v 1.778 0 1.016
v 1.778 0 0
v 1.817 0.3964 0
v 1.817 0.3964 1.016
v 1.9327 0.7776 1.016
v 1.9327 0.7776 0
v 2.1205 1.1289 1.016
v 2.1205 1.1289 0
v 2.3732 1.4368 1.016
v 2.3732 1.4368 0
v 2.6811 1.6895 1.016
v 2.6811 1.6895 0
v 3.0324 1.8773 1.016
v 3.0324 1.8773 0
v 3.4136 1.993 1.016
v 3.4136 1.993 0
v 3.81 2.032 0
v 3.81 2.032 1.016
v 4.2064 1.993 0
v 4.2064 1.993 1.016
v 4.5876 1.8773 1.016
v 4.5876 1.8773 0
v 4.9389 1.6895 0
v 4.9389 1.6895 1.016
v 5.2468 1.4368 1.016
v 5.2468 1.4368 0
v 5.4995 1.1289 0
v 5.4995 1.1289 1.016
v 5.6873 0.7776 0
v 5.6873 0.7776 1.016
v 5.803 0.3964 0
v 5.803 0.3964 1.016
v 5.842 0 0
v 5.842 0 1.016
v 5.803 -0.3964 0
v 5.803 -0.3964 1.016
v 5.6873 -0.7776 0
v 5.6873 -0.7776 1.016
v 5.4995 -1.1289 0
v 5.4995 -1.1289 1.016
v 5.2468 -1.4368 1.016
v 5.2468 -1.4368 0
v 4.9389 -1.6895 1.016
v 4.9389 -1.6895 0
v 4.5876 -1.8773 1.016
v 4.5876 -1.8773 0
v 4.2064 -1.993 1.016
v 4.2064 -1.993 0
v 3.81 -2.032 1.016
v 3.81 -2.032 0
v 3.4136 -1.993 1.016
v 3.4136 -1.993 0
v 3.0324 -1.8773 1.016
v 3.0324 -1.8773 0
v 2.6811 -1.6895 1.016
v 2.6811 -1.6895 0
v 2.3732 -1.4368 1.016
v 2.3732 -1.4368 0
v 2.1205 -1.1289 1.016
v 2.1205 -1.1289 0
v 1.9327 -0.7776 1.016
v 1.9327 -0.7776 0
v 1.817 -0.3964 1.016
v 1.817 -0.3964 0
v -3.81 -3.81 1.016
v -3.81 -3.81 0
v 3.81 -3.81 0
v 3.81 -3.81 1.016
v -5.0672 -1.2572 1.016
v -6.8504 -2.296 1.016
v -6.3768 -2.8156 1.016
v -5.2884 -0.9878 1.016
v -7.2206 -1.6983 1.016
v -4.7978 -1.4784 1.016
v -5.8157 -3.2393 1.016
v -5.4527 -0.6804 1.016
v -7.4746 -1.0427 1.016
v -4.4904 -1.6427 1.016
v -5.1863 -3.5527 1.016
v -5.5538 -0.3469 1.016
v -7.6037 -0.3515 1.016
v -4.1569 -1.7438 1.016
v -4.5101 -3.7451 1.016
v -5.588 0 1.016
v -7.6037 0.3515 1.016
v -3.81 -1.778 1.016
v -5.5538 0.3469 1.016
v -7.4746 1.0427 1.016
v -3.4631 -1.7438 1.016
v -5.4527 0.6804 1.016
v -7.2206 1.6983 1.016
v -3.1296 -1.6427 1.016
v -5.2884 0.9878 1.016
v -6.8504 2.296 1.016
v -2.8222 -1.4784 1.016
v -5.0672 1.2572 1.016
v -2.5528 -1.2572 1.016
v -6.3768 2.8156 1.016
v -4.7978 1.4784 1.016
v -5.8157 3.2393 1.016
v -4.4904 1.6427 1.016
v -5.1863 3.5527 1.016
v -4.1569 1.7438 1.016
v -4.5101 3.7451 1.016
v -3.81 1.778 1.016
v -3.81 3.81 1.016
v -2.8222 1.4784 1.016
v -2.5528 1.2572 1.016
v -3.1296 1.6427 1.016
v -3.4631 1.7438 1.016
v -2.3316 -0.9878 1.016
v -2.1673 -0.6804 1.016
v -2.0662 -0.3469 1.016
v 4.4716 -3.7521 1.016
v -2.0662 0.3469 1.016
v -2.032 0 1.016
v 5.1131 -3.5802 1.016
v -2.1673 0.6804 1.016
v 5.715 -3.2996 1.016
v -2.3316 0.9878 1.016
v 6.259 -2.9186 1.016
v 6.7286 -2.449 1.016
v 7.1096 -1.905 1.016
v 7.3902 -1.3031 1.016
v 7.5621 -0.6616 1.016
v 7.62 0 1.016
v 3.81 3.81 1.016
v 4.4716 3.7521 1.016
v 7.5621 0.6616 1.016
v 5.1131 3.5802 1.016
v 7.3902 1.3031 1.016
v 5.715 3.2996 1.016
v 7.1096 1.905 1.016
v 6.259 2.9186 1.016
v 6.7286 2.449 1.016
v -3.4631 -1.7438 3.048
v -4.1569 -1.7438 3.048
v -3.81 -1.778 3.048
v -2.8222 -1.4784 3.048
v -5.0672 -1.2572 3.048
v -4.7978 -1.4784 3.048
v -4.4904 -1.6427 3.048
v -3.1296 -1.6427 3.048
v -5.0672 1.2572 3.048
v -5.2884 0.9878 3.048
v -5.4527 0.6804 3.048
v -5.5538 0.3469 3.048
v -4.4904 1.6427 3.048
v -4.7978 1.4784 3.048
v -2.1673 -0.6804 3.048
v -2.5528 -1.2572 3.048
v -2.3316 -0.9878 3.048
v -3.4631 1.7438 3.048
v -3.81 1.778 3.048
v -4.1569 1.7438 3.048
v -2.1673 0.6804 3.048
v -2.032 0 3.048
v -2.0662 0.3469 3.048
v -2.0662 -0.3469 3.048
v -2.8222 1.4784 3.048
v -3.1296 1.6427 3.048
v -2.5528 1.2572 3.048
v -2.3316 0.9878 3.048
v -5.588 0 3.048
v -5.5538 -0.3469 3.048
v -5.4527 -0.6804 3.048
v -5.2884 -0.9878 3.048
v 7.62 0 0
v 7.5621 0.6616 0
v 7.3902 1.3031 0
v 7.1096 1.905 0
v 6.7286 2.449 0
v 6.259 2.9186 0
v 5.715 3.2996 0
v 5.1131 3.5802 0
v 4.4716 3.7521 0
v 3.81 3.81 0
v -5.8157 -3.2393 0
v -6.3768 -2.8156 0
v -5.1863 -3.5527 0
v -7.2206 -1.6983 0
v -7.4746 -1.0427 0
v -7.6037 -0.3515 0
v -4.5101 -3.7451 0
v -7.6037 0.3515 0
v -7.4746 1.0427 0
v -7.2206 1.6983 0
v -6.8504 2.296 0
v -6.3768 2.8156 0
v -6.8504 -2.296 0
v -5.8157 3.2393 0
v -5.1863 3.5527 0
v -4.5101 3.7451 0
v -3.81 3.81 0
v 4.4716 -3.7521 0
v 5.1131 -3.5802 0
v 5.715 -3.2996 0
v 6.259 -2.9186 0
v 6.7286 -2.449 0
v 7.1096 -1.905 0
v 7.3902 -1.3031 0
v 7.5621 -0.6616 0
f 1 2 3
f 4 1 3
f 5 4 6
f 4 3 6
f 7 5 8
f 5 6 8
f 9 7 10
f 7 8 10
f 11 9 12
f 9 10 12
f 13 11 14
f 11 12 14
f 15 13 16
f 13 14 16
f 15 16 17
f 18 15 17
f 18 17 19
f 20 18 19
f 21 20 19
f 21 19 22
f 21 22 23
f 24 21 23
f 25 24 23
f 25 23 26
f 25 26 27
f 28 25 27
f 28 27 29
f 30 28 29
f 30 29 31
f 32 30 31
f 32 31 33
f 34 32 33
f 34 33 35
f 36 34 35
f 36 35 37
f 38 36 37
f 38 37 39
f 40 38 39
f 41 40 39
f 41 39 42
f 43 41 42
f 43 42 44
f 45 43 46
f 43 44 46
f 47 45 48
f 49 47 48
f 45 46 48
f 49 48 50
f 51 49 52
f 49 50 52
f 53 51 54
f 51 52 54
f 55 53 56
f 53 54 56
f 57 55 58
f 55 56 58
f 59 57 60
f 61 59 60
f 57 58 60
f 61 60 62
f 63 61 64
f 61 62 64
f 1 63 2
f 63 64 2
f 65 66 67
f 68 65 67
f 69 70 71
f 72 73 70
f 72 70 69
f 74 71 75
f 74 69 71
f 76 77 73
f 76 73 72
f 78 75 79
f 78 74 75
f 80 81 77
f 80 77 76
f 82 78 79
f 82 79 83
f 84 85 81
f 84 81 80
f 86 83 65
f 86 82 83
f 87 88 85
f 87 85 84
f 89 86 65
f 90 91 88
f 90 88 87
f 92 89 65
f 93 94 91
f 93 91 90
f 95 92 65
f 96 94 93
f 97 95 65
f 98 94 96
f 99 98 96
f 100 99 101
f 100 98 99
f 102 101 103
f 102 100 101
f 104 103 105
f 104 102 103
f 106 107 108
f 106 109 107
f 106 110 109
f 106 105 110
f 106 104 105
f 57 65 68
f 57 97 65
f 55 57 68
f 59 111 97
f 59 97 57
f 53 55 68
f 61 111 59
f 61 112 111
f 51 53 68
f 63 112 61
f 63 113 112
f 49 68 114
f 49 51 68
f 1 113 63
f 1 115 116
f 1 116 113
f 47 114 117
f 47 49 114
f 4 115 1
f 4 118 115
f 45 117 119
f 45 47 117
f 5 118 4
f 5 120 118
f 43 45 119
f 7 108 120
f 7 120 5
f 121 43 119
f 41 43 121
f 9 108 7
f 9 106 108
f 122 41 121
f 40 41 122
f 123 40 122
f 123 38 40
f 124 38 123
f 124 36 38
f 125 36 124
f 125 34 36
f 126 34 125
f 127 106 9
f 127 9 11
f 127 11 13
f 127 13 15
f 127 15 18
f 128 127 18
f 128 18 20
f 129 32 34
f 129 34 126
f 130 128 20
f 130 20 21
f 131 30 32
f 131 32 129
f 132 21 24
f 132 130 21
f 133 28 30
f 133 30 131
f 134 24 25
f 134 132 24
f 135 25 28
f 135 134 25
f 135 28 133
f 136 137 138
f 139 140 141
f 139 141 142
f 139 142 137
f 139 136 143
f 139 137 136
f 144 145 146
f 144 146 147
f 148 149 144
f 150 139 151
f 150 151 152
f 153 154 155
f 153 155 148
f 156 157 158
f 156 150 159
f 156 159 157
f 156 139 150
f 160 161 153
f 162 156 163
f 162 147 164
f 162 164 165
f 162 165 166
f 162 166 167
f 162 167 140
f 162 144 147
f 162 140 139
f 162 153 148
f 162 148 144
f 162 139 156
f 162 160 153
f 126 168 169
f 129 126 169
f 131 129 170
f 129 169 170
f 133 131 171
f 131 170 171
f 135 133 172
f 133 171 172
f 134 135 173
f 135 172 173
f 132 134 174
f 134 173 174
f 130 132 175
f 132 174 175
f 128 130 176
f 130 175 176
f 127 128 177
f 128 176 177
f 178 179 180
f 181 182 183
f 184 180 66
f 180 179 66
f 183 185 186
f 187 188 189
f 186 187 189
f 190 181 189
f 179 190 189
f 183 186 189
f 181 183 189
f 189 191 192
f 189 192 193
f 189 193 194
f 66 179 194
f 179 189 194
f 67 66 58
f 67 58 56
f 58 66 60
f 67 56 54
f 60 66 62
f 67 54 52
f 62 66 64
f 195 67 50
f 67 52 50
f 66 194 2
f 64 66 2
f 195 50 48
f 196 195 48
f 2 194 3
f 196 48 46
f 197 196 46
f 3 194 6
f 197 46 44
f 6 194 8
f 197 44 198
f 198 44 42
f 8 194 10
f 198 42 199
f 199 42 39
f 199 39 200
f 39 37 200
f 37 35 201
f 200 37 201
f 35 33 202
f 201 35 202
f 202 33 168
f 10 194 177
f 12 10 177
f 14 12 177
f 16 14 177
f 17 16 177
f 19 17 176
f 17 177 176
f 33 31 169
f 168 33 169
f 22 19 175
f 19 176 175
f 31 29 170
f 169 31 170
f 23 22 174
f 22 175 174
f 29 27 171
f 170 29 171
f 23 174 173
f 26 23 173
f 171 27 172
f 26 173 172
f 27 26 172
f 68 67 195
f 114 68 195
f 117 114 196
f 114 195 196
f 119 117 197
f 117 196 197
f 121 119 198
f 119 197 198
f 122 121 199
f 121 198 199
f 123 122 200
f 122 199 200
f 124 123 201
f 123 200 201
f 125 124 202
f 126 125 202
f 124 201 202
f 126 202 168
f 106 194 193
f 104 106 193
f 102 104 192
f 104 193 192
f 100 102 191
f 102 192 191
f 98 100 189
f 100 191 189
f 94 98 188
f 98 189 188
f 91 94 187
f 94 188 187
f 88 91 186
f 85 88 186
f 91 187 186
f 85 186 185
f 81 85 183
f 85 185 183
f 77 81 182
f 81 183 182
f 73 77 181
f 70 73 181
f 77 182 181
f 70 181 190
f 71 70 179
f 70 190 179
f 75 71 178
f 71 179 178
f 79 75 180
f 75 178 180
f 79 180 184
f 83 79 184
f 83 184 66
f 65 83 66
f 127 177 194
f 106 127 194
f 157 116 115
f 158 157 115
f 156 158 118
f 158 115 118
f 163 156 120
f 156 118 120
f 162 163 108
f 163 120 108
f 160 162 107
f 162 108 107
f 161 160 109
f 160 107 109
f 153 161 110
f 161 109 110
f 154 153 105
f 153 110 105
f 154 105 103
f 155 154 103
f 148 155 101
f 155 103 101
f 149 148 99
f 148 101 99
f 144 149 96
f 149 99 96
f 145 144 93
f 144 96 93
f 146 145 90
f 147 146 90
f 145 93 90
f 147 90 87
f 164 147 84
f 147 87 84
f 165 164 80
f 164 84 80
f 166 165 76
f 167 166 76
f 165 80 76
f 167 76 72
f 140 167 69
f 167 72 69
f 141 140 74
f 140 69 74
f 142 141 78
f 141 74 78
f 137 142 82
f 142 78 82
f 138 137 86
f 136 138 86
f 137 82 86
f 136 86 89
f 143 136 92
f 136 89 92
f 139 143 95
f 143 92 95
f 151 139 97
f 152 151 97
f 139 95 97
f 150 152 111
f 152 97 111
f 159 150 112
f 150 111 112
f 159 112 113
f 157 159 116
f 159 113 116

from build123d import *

# Parameters (mm, degrees)
F1_DEPTH = 1.016
F3_D     = 4.064
F4_R     = 1.778
F5_DEPTH = 2.032


with BuildPart() as f1:
    # F0 (on Top) → F1 (new body)
    with BuildSketch(Plane.XY):
        with BuildLine():
            ThreePointArc((-3.81, -3.81), (-1.115923, -2.694077), (0, 0))
            ThreePointArc((0, 0), (-1.115923, 2.694077), (-3.81, 3.81))
            ThreePointArc((-3.81, 3.81), (-7.62, 0), (-3.81, -3.81))
        make_face()
        with BuildLine():
            ThreePointArc((3.81, 3.81), (1.115923, 2.694077), (0, 0))
            ThreePointArc((0, 0), (1.115923, -2.694077), (3.81, -3.81))
            ThreePointArc((3.81, -3.81), (6.504077, -2.694077), (7.62, 0))
            ThreePointArc((7.62, 0), (6.504077, 2.694077), (3.81, 3.81))
        make_face()
        with BuildLine():
            ThreePointArc((3.81, -3.81), (1.115923, -2.694077), (0, 0))
            ThreePointArc((0, 0), (-1.115923, -2.694077), (-3.81, -3.81))
            Line((-3.81, -3.81), (3.81, -3.81))
        make_face()
        with BuildLine():
            ThreePointArc((-3.81, 3.81), (-1.115923, 2.694077), (0, 0))
            ThreePointArc((0, 0), (1.115923, 2.694077), (3.81, 3.81))
            Line((3.81, 3.81), (-3.81, 3.81))
        make_face()
    extrude(amount=F1_DEPTH)

    # F3 (through all)
    with Locations(Plane.XY.offset(1.016)):
        with Locations((3.81, 0)):
            Hole(F3_D / 2)

    # F4 (on face) → F5 (join)
    with BuildSketch(Plane.XY.offset(1.016)):
        with Locations((-3.81, 0)):
            Circle(F4_R)
    extrude(amount=F5_DEPTH)


solid = f1.part
